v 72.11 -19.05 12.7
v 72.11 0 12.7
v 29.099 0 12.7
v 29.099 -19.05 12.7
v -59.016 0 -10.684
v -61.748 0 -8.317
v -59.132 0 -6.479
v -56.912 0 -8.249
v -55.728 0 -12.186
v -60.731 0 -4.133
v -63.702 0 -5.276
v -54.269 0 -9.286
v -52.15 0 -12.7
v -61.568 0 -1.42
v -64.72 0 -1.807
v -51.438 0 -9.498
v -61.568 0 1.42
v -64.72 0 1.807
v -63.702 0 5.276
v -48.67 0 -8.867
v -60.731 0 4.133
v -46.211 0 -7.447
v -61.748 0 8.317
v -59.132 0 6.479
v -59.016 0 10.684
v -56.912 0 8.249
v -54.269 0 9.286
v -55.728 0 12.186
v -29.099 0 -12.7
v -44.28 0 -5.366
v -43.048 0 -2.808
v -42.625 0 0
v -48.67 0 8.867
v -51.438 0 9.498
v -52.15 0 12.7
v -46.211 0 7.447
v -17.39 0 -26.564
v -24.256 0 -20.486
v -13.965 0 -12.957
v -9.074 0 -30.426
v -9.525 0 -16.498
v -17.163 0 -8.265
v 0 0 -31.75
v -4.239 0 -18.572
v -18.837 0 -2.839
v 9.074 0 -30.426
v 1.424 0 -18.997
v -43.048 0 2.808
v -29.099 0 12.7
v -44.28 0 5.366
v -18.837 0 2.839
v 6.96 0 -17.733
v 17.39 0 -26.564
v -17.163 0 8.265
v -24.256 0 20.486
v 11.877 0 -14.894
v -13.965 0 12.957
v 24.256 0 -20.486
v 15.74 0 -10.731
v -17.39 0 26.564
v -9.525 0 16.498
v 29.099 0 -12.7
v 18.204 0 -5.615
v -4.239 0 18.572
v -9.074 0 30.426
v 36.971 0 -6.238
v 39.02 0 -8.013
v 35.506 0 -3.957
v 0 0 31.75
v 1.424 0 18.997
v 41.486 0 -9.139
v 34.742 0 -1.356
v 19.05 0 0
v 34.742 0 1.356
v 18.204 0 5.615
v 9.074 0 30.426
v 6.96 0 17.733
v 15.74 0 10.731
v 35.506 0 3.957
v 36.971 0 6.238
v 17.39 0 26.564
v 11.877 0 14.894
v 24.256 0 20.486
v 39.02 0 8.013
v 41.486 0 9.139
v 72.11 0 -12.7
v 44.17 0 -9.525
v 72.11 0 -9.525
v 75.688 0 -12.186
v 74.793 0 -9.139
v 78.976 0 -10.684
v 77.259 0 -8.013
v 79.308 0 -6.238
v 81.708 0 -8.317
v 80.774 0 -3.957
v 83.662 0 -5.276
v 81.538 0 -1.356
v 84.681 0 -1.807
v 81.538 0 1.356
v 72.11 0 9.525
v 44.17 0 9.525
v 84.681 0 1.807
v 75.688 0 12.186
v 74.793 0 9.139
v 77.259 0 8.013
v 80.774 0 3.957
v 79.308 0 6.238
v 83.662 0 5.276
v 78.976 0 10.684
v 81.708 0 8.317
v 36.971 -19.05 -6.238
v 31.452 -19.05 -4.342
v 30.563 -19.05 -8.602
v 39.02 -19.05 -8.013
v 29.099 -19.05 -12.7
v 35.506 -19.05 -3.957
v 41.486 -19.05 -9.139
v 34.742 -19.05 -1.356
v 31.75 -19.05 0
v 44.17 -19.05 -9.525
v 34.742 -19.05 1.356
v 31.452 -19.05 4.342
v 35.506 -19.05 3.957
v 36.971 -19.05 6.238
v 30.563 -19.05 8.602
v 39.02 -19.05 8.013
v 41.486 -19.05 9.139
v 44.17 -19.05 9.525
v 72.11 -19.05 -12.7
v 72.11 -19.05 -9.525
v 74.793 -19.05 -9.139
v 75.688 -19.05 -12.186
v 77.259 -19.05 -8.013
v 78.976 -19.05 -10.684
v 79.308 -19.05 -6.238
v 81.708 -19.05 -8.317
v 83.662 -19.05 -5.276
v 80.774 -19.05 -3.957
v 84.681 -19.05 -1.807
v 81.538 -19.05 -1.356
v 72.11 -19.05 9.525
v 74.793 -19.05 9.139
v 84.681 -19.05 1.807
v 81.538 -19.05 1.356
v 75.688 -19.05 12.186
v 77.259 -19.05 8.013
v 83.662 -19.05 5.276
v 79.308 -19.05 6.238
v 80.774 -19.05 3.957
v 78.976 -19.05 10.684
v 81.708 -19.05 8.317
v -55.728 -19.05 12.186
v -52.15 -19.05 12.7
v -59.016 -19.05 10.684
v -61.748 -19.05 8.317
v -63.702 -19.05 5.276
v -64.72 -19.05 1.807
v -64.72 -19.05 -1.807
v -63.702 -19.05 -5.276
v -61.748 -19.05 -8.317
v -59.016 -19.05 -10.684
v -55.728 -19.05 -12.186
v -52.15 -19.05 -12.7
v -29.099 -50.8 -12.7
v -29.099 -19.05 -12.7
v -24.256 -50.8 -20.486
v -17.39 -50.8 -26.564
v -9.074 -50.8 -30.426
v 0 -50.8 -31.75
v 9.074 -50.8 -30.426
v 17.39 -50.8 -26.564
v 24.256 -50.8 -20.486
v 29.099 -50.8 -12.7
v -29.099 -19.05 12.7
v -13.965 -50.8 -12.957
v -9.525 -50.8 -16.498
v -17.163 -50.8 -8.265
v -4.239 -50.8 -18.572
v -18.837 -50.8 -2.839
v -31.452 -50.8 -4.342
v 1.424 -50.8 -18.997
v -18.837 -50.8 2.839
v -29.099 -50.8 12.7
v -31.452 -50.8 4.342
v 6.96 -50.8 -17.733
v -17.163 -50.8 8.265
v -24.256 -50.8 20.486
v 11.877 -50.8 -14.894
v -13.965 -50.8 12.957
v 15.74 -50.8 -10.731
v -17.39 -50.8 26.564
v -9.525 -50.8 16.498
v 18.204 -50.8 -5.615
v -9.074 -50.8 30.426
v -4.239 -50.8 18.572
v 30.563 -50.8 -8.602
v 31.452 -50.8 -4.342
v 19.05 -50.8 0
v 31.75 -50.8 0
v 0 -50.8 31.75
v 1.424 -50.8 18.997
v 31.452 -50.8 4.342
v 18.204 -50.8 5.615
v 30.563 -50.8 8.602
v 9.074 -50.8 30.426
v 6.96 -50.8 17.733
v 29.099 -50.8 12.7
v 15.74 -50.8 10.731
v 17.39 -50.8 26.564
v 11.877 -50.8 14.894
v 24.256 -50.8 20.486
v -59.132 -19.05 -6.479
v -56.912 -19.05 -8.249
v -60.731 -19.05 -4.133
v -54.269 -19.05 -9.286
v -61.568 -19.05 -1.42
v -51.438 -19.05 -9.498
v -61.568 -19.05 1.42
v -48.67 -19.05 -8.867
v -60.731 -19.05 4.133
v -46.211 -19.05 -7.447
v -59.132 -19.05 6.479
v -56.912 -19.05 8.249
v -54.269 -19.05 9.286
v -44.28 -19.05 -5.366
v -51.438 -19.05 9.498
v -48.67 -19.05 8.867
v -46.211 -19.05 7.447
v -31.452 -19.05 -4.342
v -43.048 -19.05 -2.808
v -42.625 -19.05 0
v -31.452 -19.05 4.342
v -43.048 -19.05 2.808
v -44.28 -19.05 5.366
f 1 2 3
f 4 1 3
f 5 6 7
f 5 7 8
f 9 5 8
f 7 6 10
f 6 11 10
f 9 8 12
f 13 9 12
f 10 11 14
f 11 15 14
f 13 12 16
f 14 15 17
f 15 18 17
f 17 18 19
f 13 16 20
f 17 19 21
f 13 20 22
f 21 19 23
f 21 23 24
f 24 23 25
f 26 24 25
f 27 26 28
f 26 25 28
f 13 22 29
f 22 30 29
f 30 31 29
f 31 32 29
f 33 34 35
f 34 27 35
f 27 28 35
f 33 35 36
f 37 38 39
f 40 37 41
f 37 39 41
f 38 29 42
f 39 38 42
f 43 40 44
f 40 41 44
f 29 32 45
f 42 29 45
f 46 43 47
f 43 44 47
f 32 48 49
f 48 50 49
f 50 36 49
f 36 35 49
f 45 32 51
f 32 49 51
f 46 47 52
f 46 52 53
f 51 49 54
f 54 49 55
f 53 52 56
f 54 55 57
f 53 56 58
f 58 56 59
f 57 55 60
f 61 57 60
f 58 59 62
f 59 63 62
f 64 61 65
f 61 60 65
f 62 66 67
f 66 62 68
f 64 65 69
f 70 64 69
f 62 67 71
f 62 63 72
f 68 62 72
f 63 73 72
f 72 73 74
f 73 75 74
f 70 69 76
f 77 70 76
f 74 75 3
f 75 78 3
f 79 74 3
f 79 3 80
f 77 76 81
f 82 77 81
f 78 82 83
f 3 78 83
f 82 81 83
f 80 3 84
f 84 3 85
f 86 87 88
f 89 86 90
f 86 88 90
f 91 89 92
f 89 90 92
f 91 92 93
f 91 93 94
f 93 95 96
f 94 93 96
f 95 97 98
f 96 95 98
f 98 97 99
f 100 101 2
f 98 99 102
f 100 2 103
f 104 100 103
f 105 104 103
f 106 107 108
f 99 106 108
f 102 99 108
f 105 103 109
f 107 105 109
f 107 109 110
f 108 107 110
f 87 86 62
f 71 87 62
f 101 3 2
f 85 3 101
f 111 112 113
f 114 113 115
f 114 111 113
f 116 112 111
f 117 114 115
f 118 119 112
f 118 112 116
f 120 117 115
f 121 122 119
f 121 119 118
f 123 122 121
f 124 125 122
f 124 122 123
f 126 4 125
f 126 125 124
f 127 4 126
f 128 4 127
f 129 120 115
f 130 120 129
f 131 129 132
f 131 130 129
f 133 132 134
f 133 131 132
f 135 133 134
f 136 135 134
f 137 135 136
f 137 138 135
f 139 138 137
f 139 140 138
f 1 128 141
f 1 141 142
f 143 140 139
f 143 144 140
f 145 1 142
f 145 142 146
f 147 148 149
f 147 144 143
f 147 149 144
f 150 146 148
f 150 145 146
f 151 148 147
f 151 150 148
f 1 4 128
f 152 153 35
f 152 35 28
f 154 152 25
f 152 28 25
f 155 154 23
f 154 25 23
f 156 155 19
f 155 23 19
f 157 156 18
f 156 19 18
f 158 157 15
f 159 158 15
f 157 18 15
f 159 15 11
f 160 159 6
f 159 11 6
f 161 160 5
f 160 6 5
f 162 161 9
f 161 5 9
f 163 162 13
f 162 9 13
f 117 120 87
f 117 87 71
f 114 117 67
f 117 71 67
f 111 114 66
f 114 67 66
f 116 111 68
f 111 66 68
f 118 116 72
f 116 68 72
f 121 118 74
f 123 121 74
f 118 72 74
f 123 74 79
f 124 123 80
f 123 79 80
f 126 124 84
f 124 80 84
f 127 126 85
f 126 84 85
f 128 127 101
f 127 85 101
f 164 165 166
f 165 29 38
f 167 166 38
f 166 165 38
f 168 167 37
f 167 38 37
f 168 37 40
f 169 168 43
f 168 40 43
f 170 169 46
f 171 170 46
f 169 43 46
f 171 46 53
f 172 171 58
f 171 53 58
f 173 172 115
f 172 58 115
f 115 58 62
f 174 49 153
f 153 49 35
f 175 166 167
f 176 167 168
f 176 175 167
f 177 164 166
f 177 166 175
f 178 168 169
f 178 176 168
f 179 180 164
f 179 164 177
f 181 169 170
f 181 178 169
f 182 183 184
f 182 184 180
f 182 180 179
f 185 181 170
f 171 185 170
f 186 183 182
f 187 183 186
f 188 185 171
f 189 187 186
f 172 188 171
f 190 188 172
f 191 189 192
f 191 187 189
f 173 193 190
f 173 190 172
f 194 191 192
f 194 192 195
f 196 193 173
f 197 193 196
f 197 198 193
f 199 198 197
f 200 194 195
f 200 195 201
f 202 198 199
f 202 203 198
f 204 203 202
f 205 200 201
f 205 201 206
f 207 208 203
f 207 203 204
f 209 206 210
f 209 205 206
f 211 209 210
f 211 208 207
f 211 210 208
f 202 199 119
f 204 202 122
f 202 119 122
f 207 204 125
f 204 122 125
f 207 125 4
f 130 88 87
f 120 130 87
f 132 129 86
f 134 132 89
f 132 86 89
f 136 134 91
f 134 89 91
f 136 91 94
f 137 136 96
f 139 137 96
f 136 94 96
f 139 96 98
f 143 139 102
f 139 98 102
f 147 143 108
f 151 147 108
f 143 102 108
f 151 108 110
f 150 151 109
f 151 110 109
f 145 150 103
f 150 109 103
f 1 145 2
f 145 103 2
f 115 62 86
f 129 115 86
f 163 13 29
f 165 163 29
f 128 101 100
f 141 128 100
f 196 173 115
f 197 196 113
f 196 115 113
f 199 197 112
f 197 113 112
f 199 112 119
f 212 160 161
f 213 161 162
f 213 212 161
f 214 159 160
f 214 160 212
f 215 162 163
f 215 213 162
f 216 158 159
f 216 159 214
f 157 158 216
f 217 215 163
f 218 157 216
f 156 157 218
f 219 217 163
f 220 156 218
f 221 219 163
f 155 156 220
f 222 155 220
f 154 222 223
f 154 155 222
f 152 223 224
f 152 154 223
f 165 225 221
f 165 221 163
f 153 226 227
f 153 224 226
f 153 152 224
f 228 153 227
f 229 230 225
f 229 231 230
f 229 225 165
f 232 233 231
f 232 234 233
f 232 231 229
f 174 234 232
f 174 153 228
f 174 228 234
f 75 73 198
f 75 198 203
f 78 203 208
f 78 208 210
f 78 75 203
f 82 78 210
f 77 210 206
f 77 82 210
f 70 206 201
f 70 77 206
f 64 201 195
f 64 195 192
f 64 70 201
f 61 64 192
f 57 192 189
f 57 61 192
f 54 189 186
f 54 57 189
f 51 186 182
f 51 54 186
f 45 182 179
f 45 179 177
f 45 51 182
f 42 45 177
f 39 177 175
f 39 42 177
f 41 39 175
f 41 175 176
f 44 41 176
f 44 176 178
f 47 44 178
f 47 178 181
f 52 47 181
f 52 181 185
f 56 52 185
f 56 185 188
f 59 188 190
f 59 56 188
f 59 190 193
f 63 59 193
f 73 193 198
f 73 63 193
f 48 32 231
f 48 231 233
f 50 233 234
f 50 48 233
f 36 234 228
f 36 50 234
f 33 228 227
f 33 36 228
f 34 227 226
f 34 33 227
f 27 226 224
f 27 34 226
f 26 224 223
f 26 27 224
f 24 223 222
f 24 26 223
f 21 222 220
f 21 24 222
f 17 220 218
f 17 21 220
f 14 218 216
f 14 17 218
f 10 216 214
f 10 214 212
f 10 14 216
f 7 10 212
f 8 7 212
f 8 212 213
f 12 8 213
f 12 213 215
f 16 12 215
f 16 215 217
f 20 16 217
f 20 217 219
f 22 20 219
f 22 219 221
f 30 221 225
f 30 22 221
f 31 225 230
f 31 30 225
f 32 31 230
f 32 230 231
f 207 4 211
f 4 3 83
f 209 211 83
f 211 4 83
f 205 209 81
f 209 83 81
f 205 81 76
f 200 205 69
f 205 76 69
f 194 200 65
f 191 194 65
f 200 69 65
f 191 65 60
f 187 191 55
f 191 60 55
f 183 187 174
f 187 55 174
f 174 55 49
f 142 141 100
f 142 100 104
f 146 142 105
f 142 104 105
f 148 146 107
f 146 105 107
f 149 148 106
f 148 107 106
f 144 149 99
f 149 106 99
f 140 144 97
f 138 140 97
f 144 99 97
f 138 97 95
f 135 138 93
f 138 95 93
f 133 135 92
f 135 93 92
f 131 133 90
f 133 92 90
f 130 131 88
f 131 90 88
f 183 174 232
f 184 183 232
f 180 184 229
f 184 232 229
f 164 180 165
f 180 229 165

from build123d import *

# Parameters (mm, degrees)
F0_R     = 19.05
F1_DEPTH = 50.8
F0_R_2   = 9.525
F2_DEPTH = 19.05


with BuildPart() as f1:
    # F0 (on Front) → F1 (new body)
    with BuildSketch(Plane.XZ):
        with BuildLine():
            ThreePointArc((29.099356, -12.7), (31.080275, -6.486831), (31.75, 0))
            ThreePointArc((31.75, 0), (31.080275, 6.486831), (29.099356, 12.7))
            ThreePointArc((29.099356, 12.7), (0, 31.75), (-29.099356, 12.7))
            ThreePointArc((-29.099356, 12.7), (-31.75, 0), (-29.099356, -12.7))
            ThreePointArc((-29.099356, -12.7), (0, -31.75), (29.099356, -12.7))
        make_face()
        Circle(F0_R, mode=Mode.SUBTRACT)
    extrude(amount=F1_DEPTH)

    # F0 (on Front) → F2 (join)
    with BuildSketch(Plane.XZ):
        with BuildLine():
            ThreePointArc((-29.099356, -12.7), (-31.75, 0), (-29.099356, 12.7))
            Line((-29.099356, 12.7), (-52.149535, 12.7))
            ThreePointArc((-52.149535, 12.7), (-64.849535, 0), (-52.149535, -12.7))
            Line((-52.149535, -12.7), (-29.099356, -12.7))
        make_face()
        with Locations((-52.149535, 0)):
            Circle(F0_R_2, mode=Mode.SUBTRACT)
        with BuildLine():
            ThreePointArc((29.099356, 12.7), (31.080275, 6.486831), (31.75, 0))
            ThreePointArc((31.75, 0), (31.080275, -6.486831), (29.099356, -12.7))
            Line((29.099356, -12.7), (72.10981, -12.7))
            ThreePointArc((72.10981, -12.7), (84.80981, 0), (72.10981, 12.7))
            Line((72.10981, 12.7), (29.099356, 12.7))
        make_face()
        with BuildLine():
            ThreePointArc((72.10981, 9.525), (81.63481, 0), (72.10981, -9.525))
            Line((72.10981, -9.525), (44.16981, -9.525))
            ThreePointArc((44.16981, -9.525), (34.64481, 0), (44.16981, 9.525))
            Line((44.16981, 9.525), (72.10981, 9.525))
        make_face(mode=Mode.SUBTRACT)
    extrude(amount=F2_DEPTH)


solid = f1.part
